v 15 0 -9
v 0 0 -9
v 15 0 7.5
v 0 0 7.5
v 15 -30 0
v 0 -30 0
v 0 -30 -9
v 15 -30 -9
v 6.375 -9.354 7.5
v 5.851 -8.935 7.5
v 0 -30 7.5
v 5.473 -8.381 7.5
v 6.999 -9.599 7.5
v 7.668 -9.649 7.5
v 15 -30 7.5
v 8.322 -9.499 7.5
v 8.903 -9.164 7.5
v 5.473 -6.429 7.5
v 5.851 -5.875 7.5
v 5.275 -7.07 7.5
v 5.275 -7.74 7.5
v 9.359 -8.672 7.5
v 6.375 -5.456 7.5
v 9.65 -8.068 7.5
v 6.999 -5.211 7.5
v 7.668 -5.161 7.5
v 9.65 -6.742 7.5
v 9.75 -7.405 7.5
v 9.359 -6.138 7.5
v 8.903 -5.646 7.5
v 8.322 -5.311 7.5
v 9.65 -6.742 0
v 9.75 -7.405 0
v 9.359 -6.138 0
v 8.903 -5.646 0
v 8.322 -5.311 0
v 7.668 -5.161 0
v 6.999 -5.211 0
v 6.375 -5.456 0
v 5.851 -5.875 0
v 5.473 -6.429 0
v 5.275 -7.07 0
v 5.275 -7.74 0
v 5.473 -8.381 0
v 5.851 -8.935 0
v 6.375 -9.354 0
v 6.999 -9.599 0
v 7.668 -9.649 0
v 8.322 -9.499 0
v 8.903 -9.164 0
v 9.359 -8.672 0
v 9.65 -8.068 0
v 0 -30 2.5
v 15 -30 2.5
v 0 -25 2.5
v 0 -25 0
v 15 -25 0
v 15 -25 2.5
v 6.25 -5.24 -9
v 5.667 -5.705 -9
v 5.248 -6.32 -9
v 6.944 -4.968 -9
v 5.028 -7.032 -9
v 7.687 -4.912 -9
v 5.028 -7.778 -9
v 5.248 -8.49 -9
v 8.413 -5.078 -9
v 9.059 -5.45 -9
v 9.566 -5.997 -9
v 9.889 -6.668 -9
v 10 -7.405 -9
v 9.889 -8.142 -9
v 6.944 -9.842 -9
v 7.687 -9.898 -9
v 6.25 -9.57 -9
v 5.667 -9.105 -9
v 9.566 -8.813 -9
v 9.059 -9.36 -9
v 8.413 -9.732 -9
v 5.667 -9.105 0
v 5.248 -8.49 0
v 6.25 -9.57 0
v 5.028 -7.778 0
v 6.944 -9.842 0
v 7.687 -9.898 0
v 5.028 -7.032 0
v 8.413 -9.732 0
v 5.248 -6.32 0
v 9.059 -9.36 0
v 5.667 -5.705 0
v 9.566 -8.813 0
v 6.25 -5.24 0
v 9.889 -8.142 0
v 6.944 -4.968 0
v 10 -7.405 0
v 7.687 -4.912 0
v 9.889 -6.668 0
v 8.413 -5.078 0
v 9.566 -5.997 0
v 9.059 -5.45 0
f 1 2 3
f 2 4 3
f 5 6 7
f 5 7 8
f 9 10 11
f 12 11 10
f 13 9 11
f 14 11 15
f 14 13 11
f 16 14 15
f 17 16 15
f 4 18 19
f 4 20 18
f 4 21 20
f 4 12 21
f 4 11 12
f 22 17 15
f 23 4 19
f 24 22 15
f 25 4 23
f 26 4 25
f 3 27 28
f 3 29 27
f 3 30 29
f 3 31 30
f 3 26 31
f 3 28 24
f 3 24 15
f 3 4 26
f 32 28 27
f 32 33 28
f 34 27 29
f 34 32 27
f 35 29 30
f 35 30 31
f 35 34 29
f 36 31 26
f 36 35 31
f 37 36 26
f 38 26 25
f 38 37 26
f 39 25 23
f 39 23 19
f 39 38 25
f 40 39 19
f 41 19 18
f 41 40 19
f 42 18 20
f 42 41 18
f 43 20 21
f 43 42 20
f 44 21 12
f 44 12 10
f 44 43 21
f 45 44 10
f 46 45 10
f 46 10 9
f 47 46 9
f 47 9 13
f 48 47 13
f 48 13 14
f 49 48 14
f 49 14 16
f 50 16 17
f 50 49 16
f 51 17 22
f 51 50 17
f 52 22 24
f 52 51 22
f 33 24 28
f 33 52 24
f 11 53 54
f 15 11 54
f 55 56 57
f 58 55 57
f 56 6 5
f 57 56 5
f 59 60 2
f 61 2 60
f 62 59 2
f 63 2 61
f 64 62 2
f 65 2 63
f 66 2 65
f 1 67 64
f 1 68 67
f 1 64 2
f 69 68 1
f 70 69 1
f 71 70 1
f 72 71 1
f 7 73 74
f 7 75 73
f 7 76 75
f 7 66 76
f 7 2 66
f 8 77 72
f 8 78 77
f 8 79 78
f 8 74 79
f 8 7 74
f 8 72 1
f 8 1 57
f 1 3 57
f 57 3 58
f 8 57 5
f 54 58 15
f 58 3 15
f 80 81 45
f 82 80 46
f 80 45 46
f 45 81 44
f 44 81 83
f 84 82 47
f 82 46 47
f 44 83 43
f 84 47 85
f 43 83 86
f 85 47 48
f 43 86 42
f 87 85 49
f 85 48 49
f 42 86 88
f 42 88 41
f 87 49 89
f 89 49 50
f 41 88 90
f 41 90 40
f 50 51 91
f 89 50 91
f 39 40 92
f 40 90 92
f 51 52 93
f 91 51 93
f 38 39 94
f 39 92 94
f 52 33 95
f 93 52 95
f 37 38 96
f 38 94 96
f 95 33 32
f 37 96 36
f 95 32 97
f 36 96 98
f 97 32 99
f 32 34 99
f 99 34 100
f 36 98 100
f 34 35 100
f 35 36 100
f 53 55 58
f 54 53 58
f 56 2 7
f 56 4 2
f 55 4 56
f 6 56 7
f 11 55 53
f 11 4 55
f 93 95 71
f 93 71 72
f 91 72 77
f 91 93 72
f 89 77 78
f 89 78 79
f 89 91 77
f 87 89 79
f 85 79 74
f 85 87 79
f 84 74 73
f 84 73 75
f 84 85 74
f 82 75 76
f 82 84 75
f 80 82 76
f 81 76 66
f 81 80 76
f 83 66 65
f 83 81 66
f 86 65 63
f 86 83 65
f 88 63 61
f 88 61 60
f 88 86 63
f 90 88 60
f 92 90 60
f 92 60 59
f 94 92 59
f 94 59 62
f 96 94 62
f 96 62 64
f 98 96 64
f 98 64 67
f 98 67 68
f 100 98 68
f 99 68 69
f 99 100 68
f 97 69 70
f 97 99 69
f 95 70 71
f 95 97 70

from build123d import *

# Parameters (mm, degrees)
F0_W     = 15
F0_H     = 25
F0_R     = 2.25
F1_DEPTH = 2.5
F2_W     = 15
F2_H     = 30
F2_R     = 2.25
F3_DEPTH = 5
F4_W     = 15
F4_H     = 30
F4_R     = 2.5
F5_DEPTH = 9


with BuildPart() as f1:
    # F0 (on Top) → F1 (new body)
    with BuildSketch(Plane.XY):
        with Locations((7.5, -12.5)):
            Rectangle(F0_W, F0_H)
        with Locations((7.5, -7.405)):
            Circle(F0_R, mode=Mode.SUBTRACT)
    extrude(amount=F1_DEPTH)

    # F2 (on face) → F3 (join)
    with BuildSketch(Plane.XY.offset(2.5)):
        with Locations((7.5, -15)):
            Rectangle(F2_W, F2_H)
        with Locations((7.5, -7.405)):
            Circle(F2_R, mode=Mode.SUBTRACT)
    extrude(amount=F3_DEPTH)

    # F4 (on face) → F5 (join)
    with BuildSketch(Plane(origin=(0, 0, 0), x_dir=(1, 0, 0), z_dir=(0, 0, -1))):
        with Locations((7.5, 15)):
            Rectangle(F4_W, F4_H)
        with Locations((7.5, 7.405)):
            Circle(F4_R, mode=Mode.SUBTRACT)
    extrude(amount=F5_DEPTH)


solid = f1.part
